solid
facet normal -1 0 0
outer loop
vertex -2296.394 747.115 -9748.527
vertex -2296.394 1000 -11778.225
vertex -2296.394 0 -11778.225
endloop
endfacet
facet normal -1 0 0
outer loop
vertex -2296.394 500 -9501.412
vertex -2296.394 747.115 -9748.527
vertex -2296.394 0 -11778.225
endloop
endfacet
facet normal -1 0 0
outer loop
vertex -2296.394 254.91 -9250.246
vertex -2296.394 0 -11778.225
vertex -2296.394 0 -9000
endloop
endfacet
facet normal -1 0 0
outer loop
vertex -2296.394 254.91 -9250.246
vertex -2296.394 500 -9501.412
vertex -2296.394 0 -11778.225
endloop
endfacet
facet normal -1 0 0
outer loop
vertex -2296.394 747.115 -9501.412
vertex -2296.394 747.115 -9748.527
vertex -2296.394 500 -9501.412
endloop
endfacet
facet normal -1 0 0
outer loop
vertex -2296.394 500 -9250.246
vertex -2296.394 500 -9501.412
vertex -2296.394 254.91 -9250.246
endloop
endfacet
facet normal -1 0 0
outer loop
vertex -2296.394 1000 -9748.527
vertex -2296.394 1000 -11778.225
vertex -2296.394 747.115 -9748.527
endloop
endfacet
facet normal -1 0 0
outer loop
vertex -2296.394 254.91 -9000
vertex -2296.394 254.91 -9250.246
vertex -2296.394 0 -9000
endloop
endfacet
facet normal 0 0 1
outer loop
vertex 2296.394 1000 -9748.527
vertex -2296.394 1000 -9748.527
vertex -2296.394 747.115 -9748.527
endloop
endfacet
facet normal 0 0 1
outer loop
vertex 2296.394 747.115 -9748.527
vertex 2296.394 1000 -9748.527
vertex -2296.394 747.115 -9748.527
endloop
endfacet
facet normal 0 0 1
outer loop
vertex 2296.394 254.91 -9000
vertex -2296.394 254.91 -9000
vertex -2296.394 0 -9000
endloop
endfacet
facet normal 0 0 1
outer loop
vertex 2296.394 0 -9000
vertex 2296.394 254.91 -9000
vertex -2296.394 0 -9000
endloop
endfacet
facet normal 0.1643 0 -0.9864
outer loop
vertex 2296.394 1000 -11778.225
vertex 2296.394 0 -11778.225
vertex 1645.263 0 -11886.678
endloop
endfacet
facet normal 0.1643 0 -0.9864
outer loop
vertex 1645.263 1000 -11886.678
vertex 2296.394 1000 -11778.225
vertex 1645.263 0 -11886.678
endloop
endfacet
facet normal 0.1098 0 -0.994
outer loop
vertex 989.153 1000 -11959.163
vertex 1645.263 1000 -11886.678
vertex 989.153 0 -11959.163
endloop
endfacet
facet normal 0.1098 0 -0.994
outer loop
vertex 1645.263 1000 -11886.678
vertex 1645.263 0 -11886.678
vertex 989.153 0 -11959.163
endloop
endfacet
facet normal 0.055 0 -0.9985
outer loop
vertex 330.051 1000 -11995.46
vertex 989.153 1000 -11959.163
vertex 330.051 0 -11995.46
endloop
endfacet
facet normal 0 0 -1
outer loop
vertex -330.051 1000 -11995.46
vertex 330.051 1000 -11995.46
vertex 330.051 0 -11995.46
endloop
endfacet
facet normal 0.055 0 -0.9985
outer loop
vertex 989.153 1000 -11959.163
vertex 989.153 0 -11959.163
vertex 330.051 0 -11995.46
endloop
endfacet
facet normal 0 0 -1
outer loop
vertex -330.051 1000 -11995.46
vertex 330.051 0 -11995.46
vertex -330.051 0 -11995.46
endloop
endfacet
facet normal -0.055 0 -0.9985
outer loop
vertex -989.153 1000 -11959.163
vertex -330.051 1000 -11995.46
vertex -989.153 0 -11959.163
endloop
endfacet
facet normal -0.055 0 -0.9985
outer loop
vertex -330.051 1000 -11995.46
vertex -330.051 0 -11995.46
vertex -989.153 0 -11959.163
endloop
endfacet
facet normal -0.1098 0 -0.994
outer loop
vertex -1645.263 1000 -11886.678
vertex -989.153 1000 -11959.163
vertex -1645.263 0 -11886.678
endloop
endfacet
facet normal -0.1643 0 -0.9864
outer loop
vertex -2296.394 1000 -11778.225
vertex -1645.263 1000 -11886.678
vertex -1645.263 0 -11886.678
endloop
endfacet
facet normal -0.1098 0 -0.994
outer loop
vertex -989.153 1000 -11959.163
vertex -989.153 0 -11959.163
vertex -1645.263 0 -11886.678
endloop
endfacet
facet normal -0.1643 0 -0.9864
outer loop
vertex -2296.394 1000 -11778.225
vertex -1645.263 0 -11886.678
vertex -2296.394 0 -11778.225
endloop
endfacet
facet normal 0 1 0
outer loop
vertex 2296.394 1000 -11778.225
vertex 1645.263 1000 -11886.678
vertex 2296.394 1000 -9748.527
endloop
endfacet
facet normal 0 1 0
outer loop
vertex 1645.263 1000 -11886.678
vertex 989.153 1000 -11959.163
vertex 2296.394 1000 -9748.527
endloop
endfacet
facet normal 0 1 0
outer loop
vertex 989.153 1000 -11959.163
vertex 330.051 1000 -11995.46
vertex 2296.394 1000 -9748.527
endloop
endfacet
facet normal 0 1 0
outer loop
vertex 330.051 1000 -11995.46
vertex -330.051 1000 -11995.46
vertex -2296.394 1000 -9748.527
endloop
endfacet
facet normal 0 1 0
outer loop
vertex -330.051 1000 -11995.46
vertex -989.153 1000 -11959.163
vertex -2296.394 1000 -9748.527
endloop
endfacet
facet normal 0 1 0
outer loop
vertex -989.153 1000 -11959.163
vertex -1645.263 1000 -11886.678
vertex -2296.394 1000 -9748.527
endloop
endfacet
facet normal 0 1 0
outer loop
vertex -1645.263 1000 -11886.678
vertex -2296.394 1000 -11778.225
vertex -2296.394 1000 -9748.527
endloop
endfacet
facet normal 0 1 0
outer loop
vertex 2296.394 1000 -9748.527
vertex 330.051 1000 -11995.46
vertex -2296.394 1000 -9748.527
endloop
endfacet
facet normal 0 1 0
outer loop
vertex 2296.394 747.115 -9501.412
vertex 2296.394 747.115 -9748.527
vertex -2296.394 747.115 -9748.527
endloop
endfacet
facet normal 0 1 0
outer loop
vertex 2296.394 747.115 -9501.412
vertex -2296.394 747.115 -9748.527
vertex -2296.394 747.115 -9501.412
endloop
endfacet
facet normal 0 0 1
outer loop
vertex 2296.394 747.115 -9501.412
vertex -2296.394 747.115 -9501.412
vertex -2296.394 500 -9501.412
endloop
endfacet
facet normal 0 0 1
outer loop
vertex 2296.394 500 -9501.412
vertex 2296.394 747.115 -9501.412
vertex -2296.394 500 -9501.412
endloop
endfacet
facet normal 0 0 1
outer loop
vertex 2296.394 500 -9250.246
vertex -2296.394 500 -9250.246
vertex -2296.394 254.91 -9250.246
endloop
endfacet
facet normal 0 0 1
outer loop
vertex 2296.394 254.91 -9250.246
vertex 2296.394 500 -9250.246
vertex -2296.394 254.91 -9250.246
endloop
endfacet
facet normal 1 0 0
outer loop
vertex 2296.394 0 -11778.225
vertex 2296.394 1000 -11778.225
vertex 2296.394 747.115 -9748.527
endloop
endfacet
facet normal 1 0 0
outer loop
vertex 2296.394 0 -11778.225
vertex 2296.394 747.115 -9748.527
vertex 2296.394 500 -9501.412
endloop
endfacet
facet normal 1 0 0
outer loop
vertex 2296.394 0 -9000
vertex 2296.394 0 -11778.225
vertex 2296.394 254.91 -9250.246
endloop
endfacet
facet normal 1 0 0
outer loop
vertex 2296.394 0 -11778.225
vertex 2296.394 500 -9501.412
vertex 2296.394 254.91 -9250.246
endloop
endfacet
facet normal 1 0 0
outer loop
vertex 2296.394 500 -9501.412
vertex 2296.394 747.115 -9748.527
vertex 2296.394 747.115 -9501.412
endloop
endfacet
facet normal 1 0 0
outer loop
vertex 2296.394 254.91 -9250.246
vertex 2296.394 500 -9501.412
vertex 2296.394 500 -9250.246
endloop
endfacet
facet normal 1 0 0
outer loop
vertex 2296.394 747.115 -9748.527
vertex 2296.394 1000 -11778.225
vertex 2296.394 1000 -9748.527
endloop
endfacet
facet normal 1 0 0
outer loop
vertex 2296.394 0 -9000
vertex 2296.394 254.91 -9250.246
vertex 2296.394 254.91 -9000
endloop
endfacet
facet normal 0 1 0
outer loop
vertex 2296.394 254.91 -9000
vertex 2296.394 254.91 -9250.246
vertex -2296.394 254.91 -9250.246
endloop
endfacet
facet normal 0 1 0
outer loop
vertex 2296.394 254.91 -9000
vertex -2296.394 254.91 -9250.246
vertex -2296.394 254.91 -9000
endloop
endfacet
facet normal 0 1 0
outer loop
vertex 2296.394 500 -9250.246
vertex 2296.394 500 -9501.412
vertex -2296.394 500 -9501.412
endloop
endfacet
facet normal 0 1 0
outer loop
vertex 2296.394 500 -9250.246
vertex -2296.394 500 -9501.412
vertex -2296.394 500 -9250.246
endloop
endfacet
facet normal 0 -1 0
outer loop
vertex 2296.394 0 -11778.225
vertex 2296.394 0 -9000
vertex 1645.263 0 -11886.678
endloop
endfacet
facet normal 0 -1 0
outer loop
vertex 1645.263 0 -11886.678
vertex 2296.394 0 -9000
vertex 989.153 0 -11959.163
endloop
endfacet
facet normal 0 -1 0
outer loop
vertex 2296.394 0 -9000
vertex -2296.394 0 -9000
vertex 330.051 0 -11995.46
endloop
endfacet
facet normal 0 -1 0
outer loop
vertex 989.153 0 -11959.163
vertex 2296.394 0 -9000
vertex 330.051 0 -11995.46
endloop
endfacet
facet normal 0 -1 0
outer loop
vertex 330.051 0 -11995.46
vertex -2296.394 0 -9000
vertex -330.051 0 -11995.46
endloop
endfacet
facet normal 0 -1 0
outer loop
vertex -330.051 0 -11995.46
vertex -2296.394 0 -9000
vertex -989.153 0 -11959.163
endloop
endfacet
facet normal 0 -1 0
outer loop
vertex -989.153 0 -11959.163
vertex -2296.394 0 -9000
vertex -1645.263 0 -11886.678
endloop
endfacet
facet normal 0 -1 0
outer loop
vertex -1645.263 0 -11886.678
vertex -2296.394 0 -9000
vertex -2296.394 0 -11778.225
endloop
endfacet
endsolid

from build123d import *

# Parameters (mm, degrees)
BOSS_EXTRUDE1_DEPTH     = 1000
CUT_EXTRUDE1_DEPTH      = 24000
BOSS_EXTRUDE2_DEPTH     = 202.99281
CUT_EXTRUDE5_START      = -4000
CUT_EXTRUDE5_DEPTH      = 4000
CUT_EXTRUDE6_DEPTH      = 2000
CUT_EXTRUDE6_DEPTH_BACK = 2000
SKETCH9_W               = 1770.722272071
SKETCH9_H               = 3199.197131872


with BuildPart() as part:
    # Sketch1 → Boss-Extrude1 (new body)
    with BuildSketch(Plane(origin=(0, 0, 0), x_dir=(1, 0, 0), z_dir=(0, 1, 0))):
        with BuildLine():
            Line((-4067.116172071, 9000), (3864.123361974, 9000))
            Line((3864.123361974, 9000), (3864.123361974, 11360.834064603))
            ThreePointArc((3864.123361974, 11360.834064603), (1958.314482503, 11839.130220908), (0, 12000))
            ThreePointArc((0, 12000), (-2064.332945394, 11821.105256725), (-4067.116172071, 11289.754915094))
            Line((-4067.116172071, 11289.754915094), (-4067.116172071, 9000))
        make_face()
    extrude(amount=BOSS_EXTRUDE1_DEPTH)

    # Sketch2 → Cut-Extrude1 (cut)
    with BuildSketch(Plane(origin=(3864.123361974, 0, 0), x_dir=(0, 0, -1), z_dir=(1, 0, 0))):
        Polygon((9000, 254.910429711), (9250.24574489, 254.910429711), (9250.24574489, 500), (9501.411916095, 500), (9501.411916095, 747.115103928), (9748.527020023, 747.115103928), (9748.527020023, 1000), (9000, 1000), align=None)
    extrude(amount=-CUT_EXTRUDE1_DEPTH, mode=Mode.SUBTRACT)

    # Sketch4 → Boss-Extrude2 (add)
    with BuildSketch(Plane(origin=(3864.123361974, 0, 0), x_dir=(0, 0, -1), z_dir=(1, 0, 0))):
        Polygon((9000, 254.910429711), (9000, 0), (11360.834064603, 0), (11360.834064603, 1000), (9748.527020023, 1000), (9748.527020023, 747.115103928), (9501.411916095, 747.115103928), (9501.411916095, 500), (9250.24574489, 500), (9250.24574489, 254.910429711), align=None)
    extrude(amount=BOSS_EXTRUDE2_DEPTH)

    # Sketch5 → Cut-Extrude5 (cut)
    with BuildSketch(Plane(origin=(0, 1000, 0), x_dir=(1, 0, 0), z_dir=(0, 1, 0)).offset(CUT_EXTRUDE5_START)):
        with BuildLine():
            Line((4067.116172071, 11289.754915094), (4067.116171974, 11360.834064603))
            Line((4067.116171974, 11360.834064603), (3864.123361974, 11360.834064603))
            ThreePointArc((3864.123361974, 11360.834064603), (3965.779015272, 11325.749282146), (4067.116172071, 11289.754915094))
        make_face()
    extrude(amount=CUT_EXTRUDE5_DEPTH, mode=Mode.SUBTRACT)

    # Sketch9 → Cut-Extrude6 (cut, two sides: drawn at the far end of the back side and taken through both)
    with BuildSketch(Plane.XZ.offset(-CUT_EXTRUDE6_DEPTH_BACK)):
        with Locations((3181.755036035, -10599.598565936)):
            Rectangle(SKETCH9_W, SKETCH9_H)
        with Locations((-3181.755036035, -10599.598565936)):
            Rectangle(SKETCH9_W, SKETCH9_H)
    extrude(amount=CUT_EXTRUDE6_DEPTH + CUT_EXTRUDE6_DEPTH_BACK, mode=Mode.SUBTRACT)


solid = part.part
